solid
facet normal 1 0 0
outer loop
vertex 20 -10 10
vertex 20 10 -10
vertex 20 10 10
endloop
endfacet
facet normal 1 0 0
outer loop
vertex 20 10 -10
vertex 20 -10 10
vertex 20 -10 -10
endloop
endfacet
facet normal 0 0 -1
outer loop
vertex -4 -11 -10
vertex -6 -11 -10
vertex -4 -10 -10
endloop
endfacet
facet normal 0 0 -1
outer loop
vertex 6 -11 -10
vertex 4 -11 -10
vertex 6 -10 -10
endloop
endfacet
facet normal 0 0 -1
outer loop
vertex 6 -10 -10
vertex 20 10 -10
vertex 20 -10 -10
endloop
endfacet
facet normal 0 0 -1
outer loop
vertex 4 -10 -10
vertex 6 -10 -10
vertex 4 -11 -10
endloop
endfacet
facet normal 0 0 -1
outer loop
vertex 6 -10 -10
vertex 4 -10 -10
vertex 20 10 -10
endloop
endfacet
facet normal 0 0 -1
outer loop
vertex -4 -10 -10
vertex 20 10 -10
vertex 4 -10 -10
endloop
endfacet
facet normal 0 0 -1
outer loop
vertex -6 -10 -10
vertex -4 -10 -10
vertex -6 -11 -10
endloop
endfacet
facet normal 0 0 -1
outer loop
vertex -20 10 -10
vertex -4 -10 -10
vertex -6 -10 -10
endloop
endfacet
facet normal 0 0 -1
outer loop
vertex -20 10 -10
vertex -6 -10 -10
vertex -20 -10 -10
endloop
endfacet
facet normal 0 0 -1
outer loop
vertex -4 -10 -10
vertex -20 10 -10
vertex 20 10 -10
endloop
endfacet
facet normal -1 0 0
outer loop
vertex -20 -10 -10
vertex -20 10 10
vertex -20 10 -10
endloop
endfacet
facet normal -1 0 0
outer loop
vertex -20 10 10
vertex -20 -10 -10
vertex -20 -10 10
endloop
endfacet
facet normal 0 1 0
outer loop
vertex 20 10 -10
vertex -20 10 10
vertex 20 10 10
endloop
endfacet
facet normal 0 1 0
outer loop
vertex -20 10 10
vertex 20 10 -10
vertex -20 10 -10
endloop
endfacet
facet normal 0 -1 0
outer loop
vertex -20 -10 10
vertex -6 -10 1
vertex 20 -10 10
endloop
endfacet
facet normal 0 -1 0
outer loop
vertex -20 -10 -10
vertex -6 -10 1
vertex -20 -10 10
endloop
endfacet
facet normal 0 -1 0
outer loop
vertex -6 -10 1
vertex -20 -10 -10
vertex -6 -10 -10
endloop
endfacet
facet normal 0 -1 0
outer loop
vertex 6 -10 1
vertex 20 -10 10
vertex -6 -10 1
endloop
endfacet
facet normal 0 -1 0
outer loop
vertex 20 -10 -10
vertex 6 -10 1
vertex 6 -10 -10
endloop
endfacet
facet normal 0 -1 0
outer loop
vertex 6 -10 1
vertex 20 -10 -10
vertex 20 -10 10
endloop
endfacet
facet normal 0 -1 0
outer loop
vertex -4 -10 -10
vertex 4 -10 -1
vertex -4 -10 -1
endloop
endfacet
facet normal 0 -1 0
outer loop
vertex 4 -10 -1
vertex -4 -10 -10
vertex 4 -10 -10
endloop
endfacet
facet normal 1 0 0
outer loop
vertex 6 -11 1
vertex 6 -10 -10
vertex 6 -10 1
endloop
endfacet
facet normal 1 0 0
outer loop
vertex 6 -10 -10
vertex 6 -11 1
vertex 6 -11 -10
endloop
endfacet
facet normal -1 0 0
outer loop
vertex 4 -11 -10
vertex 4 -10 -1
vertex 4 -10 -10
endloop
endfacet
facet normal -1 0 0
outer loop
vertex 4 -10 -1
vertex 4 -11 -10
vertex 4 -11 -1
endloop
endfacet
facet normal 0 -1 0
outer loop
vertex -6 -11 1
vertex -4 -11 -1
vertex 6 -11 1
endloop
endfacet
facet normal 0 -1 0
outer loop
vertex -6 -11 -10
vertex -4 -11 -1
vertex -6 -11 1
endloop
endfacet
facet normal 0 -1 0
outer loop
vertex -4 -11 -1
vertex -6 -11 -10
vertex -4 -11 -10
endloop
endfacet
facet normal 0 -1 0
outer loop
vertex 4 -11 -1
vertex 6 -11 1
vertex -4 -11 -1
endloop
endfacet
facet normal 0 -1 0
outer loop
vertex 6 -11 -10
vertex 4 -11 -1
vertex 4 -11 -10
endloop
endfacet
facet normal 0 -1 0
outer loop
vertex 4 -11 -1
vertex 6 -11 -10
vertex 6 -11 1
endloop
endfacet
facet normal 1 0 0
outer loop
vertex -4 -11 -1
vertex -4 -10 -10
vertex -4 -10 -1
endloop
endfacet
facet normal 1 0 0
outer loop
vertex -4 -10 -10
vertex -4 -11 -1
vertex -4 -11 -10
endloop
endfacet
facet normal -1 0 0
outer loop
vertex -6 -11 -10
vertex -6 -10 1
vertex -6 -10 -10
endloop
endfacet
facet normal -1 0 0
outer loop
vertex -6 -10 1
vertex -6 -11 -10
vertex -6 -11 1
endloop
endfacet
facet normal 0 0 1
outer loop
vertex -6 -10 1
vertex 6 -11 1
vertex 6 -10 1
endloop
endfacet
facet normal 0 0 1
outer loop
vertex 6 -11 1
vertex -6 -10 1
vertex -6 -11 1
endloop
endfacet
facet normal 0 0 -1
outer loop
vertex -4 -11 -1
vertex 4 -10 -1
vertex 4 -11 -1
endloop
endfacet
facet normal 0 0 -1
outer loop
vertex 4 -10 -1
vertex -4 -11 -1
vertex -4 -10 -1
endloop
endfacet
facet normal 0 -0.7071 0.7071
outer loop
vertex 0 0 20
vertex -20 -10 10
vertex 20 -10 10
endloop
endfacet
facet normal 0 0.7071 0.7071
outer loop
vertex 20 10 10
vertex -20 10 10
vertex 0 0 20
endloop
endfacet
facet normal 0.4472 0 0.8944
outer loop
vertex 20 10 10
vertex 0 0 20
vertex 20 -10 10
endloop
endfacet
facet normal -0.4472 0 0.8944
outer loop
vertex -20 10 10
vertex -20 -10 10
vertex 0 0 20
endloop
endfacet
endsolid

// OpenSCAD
width = 40;
depth = 20;
height = 20;

cube([width,depth,height], center=true);

// PYRAMID DEFINITION
module pyramid(w, l, h) {
	mw = w/2;
	ml = l/2;
	polyhedron(points = [
		[0,  0,  0],
		[w,  0,  0],
		[0,  l,  0],
		[w,  l,  0],
		[mw, ml, h]
	], triangles = [
		[4, 1, 0],
		[4, 3, 1],
		[4, 2, 3],
		[4, 0, 2],
		//base
		[0, 1, 2],
		[2, 1, 3]
	]);
}


// DOOR 
translate([5, -10, -5])
    cube([2, 2, 10], center=true);
translate([-5, -10, -5])
    cube([2, 2, 10], center=true);    
translate([0, -10, 0])
    cube([12, 2, 2], center=true);
    
// ROOF
translate([-20, -10, 10])
    pyramid(40,20,10);
